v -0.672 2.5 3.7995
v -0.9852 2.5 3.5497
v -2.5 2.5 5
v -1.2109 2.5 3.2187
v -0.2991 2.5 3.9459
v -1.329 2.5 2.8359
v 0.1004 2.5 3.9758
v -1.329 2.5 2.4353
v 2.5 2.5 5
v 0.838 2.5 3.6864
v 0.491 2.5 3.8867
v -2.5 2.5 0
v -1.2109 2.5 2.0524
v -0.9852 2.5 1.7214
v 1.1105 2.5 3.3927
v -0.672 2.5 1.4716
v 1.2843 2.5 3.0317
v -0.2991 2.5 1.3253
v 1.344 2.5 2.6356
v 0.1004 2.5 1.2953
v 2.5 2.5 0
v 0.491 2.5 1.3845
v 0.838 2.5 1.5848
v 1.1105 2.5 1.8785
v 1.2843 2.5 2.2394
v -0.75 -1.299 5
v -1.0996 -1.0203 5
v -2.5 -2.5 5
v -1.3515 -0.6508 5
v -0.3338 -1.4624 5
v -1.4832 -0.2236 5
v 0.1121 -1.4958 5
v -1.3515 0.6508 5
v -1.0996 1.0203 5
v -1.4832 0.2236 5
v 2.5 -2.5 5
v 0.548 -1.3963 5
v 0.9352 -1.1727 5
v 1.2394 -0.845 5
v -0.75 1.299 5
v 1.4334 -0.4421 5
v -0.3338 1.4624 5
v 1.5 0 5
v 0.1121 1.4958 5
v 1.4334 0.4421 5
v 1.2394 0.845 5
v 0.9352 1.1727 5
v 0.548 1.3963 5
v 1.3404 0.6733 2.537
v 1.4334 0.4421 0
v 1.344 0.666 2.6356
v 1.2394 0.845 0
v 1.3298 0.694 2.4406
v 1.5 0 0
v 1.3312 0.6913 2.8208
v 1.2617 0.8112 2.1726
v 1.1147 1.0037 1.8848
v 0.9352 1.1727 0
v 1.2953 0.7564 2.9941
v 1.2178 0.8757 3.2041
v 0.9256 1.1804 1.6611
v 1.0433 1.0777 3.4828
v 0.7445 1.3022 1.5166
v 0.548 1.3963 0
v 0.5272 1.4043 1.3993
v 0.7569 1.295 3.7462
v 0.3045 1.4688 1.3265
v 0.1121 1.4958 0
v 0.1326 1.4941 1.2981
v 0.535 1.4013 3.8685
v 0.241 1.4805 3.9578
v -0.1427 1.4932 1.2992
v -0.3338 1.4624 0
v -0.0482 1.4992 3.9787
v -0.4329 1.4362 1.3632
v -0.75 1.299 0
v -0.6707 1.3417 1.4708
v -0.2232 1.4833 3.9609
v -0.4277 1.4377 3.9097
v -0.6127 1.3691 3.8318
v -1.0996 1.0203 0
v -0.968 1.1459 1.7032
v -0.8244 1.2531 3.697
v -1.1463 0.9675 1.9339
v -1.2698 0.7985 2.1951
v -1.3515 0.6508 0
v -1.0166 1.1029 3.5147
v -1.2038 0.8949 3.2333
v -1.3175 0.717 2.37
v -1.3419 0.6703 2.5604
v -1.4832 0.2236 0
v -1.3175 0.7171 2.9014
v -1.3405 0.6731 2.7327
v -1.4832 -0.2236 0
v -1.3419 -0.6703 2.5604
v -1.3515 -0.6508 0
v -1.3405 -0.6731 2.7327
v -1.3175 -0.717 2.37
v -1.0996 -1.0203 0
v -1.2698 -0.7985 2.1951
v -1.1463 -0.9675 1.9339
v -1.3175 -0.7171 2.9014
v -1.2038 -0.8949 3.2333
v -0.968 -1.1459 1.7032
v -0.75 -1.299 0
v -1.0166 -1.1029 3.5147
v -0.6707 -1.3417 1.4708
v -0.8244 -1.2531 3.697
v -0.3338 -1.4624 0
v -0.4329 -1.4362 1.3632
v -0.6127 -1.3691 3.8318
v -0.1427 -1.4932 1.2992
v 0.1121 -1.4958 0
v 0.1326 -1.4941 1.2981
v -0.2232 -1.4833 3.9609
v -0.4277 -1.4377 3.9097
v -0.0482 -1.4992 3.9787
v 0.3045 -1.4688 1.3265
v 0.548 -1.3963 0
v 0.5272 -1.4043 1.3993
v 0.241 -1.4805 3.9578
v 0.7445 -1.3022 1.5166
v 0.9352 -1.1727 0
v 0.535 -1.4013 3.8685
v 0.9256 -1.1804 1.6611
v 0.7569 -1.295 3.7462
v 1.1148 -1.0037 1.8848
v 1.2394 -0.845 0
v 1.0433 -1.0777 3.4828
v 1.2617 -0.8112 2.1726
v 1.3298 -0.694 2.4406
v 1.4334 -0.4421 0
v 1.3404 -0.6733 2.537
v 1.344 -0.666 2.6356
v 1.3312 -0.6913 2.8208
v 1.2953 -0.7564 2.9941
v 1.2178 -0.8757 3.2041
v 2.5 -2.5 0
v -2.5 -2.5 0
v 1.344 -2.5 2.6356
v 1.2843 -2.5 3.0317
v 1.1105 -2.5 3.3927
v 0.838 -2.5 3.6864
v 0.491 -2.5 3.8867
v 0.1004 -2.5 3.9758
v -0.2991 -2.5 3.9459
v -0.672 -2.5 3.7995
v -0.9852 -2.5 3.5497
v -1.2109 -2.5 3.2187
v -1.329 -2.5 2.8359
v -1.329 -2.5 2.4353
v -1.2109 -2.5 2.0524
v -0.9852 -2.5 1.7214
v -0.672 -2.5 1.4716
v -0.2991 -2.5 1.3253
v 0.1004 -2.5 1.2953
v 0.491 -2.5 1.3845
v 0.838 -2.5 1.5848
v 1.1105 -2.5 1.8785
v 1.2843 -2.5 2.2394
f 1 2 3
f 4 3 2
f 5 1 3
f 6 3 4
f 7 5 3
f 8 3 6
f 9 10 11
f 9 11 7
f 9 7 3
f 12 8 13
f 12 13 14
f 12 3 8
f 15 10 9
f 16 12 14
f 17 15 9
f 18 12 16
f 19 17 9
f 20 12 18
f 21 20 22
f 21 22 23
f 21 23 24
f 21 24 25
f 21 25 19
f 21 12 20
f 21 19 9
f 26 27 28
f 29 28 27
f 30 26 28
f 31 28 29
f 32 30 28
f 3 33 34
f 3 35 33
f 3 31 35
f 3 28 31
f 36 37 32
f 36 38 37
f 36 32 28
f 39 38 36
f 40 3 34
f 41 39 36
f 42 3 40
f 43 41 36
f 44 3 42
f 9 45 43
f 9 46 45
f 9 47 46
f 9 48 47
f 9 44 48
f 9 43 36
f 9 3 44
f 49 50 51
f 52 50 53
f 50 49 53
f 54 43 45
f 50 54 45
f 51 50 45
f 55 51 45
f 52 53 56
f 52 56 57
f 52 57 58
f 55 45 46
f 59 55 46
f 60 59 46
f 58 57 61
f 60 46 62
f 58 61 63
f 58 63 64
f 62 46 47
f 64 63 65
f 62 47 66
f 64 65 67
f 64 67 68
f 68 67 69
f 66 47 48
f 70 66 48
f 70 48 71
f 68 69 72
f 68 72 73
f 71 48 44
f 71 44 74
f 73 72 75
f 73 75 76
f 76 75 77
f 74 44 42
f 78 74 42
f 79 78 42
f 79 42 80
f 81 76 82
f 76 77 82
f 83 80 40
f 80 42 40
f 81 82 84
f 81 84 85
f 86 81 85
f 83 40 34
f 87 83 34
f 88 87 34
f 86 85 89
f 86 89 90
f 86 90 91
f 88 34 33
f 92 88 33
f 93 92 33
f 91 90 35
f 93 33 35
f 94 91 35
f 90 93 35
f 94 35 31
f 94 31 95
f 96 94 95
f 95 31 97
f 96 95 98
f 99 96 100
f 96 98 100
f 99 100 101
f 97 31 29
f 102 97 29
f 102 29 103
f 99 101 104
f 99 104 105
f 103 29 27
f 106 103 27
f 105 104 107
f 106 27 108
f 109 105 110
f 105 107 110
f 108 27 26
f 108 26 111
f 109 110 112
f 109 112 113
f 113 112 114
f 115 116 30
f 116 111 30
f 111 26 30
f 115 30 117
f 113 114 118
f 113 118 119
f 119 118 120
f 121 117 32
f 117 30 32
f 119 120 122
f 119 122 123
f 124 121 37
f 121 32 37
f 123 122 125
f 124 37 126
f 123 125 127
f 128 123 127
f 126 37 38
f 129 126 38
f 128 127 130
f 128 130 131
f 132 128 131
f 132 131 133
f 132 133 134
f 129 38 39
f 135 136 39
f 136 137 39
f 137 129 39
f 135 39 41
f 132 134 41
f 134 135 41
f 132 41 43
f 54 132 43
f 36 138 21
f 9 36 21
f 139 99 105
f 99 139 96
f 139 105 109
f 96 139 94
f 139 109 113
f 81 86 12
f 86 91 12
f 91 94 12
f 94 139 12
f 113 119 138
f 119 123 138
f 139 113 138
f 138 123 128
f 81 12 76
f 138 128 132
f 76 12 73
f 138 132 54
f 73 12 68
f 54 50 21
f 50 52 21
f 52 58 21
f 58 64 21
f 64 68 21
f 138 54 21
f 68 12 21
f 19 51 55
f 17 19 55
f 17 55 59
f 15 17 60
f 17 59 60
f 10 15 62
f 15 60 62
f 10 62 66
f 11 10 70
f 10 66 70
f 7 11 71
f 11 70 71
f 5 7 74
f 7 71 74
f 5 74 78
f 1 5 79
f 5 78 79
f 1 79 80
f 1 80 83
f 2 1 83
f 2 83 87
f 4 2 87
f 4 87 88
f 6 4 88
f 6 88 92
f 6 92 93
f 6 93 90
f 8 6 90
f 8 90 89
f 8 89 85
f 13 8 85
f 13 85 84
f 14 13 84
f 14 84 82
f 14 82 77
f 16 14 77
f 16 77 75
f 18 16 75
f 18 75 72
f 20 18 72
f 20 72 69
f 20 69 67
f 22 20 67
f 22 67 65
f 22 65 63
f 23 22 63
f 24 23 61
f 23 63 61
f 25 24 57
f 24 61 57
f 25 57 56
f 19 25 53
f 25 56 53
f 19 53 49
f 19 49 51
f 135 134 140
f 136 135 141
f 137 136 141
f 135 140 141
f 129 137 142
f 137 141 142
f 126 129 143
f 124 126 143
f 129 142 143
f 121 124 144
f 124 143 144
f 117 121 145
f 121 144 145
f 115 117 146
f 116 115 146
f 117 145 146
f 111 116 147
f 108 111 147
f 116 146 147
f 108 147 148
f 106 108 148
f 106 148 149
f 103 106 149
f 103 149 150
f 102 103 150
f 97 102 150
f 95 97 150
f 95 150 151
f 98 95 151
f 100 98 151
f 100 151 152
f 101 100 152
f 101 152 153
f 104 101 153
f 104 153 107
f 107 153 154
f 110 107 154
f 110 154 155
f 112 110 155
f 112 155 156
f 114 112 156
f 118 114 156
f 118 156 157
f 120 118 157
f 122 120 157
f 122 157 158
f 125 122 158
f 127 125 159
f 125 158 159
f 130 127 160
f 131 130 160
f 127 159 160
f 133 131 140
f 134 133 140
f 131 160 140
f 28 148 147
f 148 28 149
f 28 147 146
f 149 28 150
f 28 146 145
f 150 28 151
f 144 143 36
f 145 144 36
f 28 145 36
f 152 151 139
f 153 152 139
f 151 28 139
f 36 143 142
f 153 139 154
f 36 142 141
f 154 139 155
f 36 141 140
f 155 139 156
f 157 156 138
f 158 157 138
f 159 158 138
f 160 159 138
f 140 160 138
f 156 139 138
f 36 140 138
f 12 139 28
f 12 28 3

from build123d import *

# Parameters (mm, degrees)
F0_W     = 5
F0_H     = 5
F1_DEPTH = 5
F2_R     = 1.5
F3_DEPTH = 8.0264
F5_R     = 1.344016
F6_DEPTH = 20


with BuildPart() as f1:
    # F0 (on Top) → F1 (new body)
    with BuildSketch(Plane.XY):
        Rectangle(F0_W, F0_H)
    extrude(amount=F1_DEPTH)

    # F2 (on face) → F3 (cut)
    with BuildSketch(Plane.XY.offset(5)):
        Circle(F2_R)
    extrude(amount=-F3_DEPTH, mode=Mode.SUBTRACT)

    # F5 (on face) → F6 (cut)
    with BuildSketch(Plane.XZ.offset(2.5)):
        with Locations((0, 2.635571)):
            Circle(F5_R)
    extrude(amount=-F6_DEPTH, mode=Mode.SUBTRACT)


solid = f1.part
